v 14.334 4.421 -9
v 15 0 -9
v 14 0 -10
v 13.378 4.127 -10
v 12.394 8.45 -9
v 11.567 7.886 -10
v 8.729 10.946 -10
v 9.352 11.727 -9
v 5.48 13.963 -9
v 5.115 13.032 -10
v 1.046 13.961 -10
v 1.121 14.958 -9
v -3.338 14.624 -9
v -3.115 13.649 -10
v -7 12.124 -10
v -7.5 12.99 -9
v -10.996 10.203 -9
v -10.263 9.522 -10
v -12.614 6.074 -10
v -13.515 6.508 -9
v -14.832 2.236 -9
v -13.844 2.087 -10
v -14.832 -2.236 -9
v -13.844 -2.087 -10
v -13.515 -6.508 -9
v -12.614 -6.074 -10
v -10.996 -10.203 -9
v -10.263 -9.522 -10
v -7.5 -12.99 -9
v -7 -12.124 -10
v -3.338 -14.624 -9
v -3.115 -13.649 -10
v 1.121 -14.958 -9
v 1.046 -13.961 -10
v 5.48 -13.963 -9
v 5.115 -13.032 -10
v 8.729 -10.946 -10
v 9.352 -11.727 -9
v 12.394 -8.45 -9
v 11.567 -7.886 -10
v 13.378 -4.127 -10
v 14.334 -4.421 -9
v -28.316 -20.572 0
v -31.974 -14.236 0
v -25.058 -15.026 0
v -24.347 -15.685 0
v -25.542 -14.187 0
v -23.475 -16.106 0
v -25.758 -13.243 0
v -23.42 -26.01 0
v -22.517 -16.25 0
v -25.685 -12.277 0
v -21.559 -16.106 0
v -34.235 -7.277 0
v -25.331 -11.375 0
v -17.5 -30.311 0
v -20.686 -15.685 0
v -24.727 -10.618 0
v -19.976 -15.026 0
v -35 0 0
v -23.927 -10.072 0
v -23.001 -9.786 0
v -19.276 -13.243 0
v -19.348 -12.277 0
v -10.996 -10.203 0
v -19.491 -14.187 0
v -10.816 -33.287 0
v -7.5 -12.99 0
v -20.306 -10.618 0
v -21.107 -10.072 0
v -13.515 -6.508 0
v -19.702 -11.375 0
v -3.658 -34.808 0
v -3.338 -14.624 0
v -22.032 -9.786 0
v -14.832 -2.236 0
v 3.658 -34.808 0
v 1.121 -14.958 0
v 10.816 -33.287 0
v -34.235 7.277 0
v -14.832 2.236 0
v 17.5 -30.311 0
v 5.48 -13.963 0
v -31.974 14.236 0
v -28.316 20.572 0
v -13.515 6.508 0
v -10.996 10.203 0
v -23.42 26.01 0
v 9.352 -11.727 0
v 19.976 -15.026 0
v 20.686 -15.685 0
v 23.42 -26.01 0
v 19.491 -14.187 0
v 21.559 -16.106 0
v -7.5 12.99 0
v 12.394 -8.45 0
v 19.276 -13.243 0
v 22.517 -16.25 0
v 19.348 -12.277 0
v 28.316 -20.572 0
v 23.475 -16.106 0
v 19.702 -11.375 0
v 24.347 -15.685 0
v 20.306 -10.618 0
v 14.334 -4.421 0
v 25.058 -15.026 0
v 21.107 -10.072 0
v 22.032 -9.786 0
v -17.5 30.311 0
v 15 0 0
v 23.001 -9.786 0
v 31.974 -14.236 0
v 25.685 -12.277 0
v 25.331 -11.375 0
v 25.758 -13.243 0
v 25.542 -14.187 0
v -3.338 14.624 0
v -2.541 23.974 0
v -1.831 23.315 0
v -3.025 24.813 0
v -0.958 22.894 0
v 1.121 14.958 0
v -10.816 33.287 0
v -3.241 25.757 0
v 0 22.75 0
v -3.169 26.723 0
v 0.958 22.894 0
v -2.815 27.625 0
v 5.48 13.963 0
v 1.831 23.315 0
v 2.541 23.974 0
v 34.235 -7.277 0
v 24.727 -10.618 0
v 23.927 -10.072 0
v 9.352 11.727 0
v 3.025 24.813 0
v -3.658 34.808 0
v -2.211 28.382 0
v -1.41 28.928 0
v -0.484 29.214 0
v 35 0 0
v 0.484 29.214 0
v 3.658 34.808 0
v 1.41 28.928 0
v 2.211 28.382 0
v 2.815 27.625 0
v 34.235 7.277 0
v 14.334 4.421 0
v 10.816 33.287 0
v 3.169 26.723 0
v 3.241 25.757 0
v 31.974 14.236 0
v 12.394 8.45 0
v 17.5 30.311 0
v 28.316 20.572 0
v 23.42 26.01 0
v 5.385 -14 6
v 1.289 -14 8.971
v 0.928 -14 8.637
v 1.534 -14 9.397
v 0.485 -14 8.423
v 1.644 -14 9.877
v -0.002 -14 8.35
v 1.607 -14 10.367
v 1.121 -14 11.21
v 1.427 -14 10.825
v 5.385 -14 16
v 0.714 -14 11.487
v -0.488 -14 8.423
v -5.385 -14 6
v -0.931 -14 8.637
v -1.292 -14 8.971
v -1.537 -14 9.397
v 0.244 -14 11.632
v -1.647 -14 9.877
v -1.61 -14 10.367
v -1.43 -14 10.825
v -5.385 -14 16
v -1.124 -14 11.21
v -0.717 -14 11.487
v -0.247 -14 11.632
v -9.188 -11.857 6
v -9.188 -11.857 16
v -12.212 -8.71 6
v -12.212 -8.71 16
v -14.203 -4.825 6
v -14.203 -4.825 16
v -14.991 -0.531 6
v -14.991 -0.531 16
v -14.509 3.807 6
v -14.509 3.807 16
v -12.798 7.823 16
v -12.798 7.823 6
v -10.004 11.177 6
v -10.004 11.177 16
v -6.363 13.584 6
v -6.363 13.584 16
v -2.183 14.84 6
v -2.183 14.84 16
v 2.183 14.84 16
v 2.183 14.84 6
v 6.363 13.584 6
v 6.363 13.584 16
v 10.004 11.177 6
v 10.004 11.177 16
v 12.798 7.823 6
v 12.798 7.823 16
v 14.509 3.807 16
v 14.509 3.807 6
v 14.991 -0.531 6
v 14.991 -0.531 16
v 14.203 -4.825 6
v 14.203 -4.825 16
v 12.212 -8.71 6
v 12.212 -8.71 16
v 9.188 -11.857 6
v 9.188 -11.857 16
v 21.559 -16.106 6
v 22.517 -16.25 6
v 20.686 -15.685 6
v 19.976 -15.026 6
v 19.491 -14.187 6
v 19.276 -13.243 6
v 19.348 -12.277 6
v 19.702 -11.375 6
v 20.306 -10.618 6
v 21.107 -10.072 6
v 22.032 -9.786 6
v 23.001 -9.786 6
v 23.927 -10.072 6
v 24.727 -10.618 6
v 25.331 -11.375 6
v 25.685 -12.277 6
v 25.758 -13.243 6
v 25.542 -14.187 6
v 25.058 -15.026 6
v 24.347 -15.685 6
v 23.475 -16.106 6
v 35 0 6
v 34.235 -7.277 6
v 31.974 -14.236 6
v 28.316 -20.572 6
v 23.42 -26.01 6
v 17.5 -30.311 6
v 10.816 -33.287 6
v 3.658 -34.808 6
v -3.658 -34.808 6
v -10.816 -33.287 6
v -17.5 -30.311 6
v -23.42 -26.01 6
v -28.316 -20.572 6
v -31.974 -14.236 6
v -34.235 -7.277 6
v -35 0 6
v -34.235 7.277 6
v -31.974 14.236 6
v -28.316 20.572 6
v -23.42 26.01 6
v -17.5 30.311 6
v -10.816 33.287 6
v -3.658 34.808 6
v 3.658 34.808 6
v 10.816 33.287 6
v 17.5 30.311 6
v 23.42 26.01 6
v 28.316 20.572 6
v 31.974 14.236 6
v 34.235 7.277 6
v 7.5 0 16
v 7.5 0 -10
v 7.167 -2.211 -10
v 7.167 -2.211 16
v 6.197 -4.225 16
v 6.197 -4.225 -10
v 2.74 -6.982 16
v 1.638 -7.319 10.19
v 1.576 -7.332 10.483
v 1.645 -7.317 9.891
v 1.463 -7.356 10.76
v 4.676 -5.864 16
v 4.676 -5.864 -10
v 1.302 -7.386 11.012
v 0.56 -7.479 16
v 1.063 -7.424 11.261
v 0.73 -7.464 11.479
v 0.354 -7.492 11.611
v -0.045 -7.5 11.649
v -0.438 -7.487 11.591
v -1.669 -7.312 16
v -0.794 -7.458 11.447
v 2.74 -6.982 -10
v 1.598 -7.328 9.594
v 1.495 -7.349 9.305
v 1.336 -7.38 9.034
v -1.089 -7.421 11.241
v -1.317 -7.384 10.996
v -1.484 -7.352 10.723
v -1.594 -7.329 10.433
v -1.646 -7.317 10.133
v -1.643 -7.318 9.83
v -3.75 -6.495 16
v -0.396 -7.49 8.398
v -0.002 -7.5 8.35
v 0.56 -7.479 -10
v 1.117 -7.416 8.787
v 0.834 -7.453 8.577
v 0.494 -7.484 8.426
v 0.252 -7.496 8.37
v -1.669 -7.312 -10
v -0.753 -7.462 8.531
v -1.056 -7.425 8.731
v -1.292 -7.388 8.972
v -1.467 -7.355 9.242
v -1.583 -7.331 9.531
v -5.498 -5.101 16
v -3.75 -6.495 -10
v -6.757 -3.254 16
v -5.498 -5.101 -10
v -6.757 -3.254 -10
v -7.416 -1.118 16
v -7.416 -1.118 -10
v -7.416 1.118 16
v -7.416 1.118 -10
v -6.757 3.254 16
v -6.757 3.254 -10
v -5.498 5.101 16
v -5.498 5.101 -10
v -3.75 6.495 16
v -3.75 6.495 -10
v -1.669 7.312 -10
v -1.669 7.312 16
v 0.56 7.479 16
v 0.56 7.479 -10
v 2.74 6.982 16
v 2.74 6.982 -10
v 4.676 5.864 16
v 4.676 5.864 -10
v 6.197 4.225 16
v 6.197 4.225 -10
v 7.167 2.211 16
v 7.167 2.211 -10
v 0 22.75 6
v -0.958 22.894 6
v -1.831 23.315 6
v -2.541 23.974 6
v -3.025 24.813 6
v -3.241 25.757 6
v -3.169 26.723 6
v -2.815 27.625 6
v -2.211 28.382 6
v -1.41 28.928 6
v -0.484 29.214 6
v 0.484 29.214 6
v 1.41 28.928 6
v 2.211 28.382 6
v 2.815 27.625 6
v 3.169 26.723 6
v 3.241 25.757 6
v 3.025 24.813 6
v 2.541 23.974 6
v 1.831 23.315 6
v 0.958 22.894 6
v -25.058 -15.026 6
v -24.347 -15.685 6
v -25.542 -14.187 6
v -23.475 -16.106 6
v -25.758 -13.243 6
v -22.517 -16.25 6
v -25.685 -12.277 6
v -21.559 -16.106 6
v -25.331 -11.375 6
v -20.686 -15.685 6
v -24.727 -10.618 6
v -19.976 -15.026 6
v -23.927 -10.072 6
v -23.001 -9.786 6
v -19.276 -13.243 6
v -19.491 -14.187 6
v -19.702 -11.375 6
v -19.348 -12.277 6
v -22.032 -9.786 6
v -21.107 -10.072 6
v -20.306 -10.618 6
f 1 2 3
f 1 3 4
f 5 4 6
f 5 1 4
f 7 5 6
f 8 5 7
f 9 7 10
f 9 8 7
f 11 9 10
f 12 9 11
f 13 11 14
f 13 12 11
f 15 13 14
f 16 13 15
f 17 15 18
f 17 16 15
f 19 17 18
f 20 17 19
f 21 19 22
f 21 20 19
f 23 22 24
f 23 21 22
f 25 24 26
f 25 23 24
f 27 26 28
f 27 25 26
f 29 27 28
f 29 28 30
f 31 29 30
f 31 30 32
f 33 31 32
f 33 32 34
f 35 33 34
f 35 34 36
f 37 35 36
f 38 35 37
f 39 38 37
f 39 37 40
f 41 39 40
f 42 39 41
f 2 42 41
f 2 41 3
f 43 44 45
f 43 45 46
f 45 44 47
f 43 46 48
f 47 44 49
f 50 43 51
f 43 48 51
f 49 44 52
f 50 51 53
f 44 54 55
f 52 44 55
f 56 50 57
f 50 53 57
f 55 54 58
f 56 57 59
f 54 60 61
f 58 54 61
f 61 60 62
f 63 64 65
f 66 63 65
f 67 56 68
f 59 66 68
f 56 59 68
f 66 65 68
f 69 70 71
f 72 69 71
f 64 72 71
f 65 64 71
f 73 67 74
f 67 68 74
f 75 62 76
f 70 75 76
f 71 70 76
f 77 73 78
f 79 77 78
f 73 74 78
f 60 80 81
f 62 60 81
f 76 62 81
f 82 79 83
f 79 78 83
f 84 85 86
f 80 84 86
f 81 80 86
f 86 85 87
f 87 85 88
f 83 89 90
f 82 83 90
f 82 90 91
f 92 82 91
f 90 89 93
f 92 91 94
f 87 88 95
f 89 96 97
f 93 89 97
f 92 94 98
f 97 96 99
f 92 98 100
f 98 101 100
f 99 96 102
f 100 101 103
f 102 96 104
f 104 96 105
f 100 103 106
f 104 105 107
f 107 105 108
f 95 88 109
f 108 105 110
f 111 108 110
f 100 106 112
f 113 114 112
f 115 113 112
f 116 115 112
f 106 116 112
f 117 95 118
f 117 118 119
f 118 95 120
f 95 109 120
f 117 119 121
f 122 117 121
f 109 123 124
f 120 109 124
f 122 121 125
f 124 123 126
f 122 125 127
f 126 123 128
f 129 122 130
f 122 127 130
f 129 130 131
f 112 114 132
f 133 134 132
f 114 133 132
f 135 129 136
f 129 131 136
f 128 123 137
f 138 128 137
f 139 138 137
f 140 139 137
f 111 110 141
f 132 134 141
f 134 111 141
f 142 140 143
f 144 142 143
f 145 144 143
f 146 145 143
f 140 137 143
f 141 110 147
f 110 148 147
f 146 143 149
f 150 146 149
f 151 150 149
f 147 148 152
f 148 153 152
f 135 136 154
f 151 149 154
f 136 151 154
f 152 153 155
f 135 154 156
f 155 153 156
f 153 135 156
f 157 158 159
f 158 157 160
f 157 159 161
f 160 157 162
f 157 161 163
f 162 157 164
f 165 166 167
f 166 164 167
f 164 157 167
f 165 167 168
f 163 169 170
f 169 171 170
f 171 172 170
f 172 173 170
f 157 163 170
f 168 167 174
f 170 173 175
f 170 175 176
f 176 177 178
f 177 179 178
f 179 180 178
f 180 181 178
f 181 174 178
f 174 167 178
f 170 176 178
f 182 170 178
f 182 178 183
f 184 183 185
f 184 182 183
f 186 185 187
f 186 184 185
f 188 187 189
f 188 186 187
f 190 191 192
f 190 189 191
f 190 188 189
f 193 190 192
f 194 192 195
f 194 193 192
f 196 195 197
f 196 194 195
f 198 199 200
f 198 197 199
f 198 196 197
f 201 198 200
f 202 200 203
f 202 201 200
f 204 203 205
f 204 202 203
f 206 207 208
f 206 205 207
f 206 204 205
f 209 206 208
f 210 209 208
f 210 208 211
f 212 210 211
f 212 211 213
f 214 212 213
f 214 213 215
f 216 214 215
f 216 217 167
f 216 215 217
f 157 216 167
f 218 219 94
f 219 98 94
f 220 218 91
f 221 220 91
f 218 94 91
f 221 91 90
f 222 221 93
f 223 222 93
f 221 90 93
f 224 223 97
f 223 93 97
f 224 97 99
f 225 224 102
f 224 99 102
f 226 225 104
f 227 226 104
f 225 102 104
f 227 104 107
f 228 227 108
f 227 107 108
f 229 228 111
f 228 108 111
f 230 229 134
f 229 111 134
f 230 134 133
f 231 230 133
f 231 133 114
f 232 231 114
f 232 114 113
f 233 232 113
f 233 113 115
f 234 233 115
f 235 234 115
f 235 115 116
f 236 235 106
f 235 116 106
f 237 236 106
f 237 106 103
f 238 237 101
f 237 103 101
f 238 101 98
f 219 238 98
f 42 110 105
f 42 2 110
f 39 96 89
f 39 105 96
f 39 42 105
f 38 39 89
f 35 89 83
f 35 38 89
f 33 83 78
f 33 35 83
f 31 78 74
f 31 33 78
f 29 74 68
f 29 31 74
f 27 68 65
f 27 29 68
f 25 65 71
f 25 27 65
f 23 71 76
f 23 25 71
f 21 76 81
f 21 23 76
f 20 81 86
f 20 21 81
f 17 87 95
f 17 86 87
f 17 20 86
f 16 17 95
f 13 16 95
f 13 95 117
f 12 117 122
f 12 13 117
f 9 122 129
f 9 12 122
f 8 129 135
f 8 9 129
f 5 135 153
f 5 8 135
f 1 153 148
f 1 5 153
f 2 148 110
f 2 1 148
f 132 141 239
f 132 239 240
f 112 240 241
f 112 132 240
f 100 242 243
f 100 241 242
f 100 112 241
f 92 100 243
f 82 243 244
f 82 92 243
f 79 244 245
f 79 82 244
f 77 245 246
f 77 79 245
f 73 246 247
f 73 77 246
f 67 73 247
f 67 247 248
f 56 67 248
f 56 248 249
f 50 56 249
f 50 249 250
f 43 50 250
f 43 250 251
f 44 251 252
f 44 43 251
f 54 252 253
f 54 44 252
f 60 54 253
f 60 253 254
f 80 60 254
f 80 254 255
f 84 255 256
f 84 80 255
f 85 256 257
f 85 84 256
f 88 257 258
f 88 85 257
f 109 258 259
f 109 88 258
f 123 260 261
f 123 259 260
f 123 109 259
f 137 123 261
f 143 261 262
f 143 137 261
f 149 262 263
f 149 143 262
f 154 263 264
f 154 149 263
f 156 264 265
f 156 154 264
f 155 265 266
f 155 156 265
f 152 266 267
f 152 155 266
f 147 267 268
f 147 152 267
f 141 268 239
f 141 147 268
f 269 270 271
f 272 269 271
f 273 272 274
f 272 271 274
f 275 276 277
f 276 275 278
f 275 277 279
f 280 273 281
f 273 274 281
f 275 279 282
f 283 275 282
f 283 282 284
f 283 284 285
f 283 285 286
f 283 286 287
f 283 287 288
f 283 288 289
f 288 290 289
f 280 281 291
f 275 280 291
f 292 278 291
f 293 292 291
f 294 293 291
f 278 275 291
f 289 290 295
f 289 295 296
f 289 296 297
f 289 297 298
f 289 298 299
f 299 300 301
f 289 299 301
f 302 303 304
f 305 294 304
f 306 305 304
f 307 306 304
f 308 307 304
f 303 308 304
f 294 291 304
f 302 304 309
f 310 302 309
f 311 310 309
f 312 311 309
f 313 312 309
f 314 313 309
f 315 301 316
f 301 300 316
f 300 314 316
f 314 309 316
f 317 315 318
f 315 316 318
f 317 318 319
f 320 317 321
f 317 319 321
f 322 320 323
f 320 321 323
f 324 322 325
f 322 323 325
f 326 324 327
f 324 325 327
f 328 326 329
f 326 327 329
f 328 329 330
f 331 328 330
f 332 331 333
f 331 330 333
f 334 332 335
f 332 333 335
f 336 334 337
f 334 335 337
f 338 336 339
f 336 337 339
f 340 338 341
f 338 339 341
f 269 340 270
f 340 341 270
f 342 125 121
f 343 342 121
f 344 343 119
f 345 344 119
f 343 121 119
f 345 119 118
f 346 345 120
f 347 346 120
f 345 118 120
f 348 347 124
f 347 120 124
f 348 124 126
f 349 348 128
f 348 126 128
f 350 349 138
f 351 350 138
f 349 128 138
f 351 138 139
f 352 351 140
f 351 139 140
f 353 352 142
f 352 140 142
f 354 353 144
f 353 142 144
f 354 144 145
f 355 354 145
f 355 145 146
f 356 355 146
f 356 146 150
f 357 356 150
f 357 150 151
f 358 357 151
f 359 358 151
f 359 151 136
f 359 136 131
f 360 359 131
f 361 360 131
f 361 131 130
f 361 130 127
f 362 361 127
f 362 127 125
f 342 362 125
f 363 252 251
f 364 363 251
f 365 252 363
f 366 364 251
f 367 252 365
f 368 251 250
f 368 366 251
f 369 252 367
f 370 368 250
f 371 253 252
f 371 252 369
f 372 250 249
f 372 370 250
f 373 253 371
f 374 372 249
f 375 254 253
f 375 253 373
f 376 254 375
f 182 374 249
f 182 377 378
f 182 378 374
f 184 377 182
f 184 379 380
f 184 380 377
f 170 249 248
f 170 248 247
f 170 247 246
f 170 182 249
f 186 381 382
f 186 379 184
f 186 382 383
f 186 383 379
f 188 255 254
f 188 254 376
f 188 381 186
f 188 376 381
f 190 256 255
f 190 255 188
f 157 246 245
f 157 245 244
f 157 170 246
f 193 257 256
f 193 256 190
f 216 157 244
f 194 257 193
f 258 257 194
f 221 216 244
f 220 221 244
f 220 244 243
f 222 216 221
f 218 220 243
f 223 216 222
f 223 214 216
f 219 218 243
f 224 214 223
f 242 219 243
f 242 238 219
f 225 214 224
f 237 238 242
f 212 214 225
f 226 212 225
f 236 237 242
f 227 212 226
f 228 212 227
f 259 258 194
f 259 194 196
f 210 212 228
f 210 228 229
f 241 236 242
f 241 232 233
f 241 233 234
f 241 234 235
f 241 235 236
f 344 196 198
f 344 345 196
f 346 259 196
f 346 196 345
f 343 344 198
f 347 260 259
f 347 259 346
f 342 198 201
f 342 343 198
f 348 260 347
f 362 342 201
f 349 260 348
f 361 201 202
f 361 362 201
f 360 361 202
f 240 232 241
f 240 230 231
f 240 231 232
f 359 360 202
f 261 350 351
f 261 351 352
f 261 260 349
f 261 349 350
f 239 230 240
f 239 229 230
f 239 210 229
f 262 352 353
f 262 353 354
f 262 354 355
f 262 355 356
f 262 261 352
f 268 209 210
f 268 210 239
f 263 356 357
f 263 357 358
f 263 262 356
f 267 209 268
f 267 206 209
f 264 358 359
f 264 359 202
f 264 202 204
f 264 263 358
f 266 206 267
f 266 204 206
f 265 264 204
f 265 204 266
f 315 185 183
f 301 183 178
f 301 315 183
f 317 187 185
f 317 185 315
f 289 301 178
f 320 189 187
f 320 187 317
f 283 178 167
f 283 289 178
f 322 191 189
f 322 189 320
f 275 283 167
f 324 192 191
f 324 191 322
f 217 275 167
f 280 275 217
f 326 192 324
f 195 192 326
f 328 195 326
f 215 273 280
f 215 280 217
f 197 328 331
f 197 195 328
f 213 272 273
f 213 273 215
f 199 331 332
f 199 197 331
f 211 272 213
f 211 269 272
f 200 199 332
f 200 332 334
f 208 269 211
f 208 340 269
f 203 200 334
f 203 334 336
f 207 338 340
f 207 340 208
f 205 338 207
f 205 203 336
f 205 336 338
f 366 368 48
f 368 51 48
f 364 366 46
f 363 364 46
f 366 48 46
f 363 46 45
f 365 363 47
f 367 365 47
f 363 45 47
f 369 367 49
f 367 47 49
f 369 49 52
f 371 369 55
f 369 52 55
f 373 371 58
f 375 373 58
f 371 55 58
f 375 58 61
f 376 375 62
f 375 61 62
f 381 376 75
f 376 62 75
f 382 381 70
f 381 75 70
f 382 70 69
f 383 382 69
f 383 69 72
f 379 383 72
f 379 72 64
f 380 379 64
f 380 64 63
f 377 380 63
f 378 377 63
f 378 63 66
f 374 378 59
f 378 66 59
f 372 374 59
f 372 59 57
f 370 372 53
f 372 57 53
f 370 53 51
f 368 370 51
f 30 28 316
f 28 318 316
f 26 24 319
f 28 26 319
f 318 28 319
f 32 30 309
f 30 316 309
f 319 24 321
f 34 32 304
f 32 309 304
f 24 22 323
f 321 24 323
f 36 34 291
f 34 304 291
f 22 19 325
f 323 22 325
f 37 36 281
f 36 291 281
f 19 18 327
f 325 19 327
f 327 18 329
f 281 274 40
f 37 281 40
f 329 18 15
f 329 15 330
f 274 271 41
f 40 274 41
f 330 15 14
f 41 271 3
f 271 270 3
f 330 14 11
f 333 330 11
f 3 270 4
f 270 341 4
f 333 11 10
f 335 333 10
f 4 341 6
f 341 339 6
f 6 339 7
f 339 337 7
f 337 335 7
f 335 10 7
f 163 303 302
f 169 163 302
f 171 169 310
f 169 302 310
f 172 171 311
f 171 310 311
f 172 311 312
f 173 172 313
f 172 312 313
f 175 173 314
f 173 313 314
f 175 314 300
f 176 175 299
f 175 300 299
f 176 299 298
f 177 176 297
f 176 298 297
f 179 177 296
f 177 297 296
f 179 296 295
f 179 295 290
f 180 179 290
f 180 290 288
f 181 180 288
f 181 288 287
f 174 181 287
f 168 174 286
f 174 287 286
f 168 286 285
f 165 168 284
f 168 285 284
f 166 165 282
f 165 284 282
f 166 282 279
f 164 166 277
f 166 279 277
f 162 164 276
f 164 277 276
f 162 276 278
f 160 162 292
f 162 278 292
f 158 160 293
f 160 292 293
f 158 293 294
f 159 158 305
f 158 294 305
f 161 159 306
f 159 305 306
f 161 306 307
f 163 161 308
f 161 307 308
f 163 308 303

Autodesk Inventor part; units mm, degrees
ref_plane "YZ Plane" through (0, 0, 0) normal (1, 0, 0) x (0, 1, 0)
ref_plane "XY Plane" through (0, 0, 0) normal (0, 0, 1) x (1, 0, 0)
sketch "Skizze1" plane through (0, 0, 0) normal (0, 1, 0) x (-1, 0, 0)
  line L0 (-15, 16) -> (-7.5, 16)
  line L1 (-7.5, 16) -> (-7.5, -10)
  line L2 (-15, 16) -> (-15, 6)
  line L3 (-15, 6) -> (-35, 6)
  line L4 (-35, 6) -> (-35, 0)
  line L5 (-35, 0) -> (-15, 0)
  line L6 (-15, 0) -> (-15, -10)
  line L7 (0, -15.2) -> (0, 21.2) projected
  line L8 (-7.5, -10) -> (-15, -10)
  point P0 (0, 0)
  dimension "d0" = 30
  dimension "d1" = 15
  dimension "d2" = 70
  dimension "d3" = 6
  dimension "d4" = 10
  dimension "d5" = 10
revolve "Umdrehung1" add sketch "Skizze1" angle 360 about axis through (0, 0, -10) along (0, 0, 1)
ref_plane "Arbeitsebene1" through (0, -16, 0) normal (0, 1, 0) x (-1, 0, 0)
sketch "Skizze2" plane through (0, -16, 0) normal (0, 1, 0) x (-1, 0, 0)
  line L0 (15, 16) -> (-15, 16) projected
  line L1 (15, 6) -> (-15, 6) projected
  line L2 (6, 16) -> (-6, 16)
  line L3 (-6, 16) -> (-6, 6)
  line L4 (-6, 6) -> (6, 6)
  line L5 (6, 6) -> (6, 16)
  line L6 (0, -2.8) -> (0, 16.8) projected
  point P0 (0, 0)
  dimension "d8" = 12
extrude "Extrusion1" cut sketch "Skizze2" along normal blind 2
sketch "Skizze4" plane through (0, -14, 0) normal (0, -1, 0) x (1, 0, 0)
  line L0 (-5.3852, 16) -> (5.3852, 16) projected
  point P0 (0, 0)
  point P1 (-0.0015, 10)
  dimension "d18" = 6
hole "Bohrung2" at (-0.0015, -14, 10) direction (0, 1, 0) diameter 3.3 depth 10 tip angle 118
thread "Gewinde1" size "M4x0.7" class "6H" standard "ANSI Metric M Profile" full length
sketch "Skizze6" plane through (0, 0, 6) normal (0, 0, 1) x (1, 0, 0)
  circle A0 centre (0, 0) radius 35 projected
  point P0 (0, 26)
  point P1 (-22.5167, -13)
  point P2 (22.5167, -13)
  dimension "d40" = 26
  dimension "d41" = 0
  dimension "d44" = 360
hole "Bohrung4" at (0, 26, 6) at (-22.5167, -13, 6) at (22.5167, -13, 6) direction (0, 0, -1) diameter 6.5 depth 35 tip angle 118
chamfer "Fase1" distance 1 angle 45 1 edges at (-15, 0, -10)
properties part number "Matrizenhalterung_unten" material "Stahl"
